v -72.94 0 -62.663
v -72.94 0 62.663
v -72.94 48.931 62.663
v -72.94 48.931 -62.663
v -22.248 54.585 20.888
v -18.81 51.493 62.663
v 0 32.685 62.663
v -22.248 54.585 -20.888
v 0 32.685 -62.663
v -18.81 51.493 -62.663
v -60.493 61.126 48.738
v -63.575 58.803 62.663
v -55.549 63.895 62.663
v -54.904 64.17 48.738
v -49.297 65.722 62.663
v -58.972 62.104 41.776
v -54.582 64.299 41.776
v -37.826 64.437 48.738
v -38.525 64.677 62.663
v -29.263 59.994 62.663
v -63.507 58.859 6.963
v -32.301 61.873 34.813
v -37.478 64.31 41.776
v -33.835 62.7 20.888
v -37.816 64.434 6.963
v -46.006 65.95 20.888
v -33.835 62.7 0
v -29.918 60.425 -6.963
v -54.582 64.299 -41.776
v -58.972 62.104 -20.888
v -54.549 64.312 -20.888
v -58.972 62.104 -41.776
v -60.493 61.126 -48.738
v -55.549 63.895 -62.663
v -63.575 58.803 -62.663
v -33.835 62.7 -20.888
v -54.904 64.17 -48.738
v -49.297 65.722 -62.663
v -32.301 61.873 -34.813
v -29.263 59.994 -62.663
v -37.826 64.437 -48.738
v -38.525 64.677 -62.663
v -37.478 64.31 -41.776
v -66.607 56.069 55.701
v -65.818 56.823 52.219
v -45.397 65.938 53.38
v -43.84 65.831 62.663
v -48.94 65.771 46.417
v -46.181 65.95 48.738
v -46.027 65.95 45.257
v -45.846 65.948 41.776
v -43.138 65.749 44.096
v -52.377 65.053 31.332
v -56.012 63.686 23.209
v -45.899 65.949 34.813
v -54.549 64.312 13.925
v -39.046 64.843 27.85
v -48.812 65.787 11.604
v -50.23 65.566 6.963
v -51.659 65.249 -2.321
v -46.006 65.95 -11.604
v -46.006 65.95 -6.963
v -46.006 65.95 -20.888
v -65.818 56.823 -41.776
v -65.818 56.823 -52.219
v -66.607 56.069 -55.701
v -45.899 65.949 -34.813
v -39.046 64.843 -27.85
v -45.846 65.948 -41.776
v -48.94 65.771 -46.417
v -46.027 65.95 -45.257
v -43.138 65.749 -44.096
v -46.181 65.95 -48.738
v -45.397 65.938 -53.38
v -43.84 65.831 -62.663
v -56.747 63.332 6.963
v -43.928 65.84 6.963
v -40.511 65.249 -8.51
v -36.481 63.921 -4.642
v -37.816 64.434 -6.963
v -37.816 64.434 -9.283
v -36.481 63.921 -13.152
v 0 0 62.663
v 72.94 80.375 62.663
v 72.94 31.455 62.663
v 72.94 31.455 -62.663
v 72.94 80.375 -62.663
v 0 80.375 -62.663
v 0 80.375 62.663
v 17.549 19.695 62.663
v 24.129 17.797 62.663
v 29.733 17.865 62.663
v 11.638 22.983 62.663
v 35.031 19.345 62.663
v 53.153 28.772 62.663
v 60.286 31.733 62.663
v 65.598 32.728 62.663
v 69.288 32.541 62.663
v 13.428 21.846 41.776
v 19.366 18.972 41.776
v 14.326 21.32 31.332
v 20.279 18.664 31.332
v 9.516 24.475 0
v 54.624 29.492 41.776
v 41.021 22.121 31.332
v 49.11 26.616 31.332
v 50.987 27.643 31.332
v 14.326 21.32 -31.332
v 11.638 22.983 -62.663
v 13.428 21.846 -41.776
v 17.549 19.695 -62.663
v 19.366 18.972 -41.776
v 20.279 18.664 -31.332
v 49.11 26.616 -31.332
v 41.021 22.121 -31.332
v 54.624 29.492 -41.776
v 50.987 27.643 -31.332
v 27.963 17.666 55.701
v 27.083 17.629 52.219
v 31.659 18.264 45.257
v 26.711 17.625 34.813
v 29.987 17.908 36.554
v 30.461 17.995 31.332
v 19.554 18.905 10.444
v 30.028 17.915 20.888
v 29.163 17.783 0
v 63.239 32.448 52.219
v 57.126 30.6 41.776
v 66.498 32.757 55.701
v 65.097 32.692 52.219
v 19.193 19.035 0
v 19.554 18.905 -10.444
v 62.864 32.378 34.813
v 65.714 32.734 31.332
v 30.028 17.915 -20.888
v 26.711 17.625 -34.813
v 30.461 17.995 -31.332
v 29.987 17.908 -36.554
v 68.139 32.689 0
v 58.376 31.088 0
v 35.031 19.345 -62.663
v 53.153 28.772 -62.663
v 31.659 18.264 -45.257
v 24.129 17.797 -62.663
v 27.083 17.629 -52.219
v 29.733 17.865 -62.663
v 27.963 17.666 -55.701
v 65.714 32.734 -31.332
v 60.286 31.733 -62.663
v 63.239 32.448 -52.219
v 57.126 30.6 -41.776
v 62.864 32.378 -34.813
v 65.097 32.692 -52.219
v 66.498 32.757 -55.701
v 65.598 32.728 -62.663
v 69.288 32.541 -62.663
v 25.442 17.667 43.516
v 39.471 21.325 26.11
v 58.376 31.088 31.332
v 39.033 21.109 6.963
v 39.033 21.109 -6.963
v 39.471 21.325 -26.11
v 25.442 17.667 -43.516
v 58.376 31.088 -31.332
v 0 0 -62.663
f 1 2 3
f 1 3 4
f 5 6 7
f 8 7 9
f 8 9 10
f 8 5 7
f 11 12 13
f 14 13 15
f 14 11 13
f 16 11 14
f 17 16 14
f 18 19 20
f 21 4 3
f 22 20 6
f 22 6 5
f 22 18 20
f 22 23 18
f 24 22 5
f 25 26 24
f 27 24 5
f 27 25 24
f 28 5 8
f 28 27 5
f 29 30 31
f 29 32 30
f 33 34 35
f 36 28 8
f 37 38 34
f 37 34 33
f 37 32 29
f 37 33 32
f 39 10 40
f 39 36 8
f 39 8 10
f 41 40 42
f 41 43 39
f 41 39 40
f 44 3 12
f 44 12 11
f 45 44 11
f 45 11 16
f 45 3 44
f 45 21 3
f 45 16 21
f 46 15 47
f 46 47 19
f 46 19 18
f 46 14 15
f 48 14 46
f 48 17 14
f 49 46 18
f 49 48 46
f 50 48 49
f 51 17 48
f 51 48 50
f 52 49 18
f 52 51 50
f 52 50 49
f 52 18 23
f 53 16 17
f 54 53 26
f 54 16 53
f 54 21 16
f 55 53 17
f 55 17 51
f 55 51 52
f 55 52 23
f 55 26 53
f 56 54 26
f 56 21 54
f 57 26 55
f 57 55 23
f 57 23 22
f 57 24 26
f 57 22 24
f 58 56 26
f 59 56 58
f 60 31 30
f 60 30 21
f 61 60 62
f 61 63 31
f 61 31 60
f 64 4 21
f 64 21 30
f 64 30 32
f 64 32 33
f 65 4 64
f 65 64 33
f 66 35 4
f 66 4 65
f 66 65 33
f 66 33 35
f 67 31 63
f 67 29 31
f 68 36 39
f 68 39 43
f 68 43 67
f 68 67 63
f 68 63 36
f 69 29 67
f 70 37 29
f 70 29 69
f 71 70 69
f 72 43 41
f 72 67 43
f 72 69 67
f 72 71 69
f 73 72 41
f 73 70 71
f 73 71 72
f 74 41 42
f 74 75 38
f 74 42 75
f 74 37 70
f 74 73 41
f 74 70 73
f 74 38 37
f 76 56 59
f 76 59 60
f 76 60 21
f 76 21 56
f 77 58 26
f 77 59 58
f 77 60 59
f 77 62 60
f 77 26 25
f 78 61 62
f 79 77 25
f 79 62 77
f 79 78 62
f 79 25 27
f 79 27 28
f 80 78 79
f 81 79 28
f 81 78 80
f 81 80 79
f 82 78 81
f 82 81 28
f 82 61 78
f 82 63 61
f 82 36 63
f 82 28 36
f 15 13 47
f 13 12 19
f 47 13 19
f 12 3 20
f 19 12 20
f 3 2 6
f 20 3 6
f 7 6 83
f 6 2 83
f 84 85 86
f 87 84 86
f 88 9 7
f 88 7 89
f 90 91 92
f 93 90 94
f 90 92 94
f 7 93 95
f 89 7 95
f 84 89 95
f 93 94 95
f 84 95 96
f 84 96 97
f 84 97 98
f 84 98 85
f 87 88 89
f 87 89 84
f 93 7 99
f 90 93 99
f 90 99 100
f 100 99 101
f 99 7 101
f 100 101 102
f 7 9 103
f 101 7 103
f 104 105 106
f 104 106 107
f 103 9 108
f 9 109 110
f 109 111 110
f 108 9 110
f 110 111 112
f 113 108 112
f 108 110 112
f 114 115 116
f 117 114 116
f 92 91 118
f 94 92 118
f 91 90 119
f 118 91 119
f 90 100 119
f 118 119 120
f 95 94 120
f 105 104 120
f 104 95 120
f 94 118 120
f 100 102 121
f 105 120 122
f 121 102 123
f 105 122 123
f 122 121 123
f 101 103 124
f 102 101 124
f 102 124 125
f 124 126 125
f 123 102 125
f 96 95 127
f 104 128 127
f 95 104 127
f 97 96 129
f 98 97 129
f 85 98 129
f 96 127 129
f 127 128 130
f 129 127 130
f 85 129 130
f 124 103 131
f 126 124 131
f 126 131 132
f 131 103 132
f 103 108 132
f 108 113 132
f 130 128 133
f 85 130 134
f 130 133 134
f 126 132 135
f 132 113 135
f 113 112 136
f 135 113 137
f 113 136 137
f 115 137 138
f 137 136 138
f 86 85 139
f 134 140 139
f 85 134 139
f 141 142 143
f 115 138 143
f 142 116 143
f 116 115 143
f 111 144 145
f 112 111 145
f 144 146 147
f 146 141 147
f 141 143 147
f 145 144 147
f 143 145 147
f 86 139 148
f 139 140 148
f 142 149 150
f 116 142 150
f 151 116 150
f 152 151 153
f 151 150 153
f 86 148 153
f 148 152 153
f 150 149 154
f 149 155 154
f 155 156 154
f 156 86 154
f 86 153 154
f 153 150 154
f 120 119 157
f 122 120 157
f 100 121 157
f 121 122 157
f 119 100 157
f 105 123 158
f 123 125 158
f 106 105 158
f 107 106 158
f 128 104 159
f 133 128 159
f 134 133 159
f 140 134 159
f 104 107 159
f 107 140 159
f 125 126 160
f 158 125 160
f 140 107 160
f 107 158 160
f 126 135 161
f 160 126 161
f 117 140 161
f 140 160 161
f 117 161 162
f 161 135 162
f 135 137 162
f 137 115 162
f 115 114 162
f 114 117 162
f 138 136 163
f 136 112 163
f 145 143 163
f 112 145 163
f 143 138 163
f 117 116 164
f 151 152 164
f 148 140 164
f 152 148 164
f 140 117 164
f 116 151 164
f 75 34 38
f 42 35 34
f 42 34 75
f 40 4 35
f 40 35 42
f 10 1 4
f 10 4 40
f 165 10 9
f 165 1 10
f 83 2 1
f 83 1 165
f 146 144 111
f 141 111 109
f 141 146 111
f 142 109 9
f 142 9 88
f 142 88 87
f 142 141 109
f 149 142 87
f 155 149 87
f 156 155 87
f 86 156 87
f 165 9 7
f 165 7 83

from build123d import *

# Parameters (mm, degrees)
SKETCH1_W           = 145.880200278
SKETCH1_H           = 125.32663254
BOSS_EXTRUDE1_DEPTH = 80.374704292
INTERSECT1_START    = -62.66331627
INTERSECT1_DEPTH    = 125.32663254


# Read off the part's stored shape, not the designer's step: Intersect1
with BuildPart() as part:
    # Sketch1 → Boss-Extrude1 (new body)
    with BuildSketch(Plane(origin=(0, 0, 0), x_dir=(1, 0, 0), z_dir=(0, 1, 0))):
        Rectangle(SKETCH1_W, SKETCH1_H)
    extrude(amount=BOSS_EXTRUDE1_DEPTH)

    # Intersect1 outline → Intersect1 (cut)
    with BuildSketch(Plane.XY.offset(INTERSECT1_START)):
        with BuildLine():
            Line((-72.940100139, 80.374704292), (-72.940100139, 48.931437063))
            add(Edge.make_bspline(
                [(-72.940100139, 48.931437063), (-43.863738313, 86.090121594), (-22.048252395, 53.903227083), (0, 32.685028068)],
                knots=[0.072658952, 0.072658952, 0.072658952, 0.072658952, 0.486913588, 0.486913588, 0.486913588, 0.486913588], degree=3))
            Line((0, 32.685028068), (0, 80.374704292))
            Line((0, 80.374704292), (-72.940100139, 80.374704292))
        make_face()
        with BuildLine():
            add(Edge.make_bspline(
                [(0, 32.685028068), (9.479341915, 23.562556152), (32.238180531, 6.605314214), (58.644645951, 37.689666929), (72.940100139, 31.455238757)],
                knots=[0.486913588, 0.486913588, 0.486913588, 0.486913588, 0.665016653, 0.912587019, 0.912587019, 0.912587019, 0.912587019], degree=3))
            Line((0, 32.685028068), (0, 0))
            Line((0, 0), (72.940100139, 0))
            Line((72.940100139, 0), (72.940100139, 31.455238757))
        make_face()
    extrude(amount=INTERSECT1_DEPTH, mode=Mode.SUBTRACT)


solid = part.part
